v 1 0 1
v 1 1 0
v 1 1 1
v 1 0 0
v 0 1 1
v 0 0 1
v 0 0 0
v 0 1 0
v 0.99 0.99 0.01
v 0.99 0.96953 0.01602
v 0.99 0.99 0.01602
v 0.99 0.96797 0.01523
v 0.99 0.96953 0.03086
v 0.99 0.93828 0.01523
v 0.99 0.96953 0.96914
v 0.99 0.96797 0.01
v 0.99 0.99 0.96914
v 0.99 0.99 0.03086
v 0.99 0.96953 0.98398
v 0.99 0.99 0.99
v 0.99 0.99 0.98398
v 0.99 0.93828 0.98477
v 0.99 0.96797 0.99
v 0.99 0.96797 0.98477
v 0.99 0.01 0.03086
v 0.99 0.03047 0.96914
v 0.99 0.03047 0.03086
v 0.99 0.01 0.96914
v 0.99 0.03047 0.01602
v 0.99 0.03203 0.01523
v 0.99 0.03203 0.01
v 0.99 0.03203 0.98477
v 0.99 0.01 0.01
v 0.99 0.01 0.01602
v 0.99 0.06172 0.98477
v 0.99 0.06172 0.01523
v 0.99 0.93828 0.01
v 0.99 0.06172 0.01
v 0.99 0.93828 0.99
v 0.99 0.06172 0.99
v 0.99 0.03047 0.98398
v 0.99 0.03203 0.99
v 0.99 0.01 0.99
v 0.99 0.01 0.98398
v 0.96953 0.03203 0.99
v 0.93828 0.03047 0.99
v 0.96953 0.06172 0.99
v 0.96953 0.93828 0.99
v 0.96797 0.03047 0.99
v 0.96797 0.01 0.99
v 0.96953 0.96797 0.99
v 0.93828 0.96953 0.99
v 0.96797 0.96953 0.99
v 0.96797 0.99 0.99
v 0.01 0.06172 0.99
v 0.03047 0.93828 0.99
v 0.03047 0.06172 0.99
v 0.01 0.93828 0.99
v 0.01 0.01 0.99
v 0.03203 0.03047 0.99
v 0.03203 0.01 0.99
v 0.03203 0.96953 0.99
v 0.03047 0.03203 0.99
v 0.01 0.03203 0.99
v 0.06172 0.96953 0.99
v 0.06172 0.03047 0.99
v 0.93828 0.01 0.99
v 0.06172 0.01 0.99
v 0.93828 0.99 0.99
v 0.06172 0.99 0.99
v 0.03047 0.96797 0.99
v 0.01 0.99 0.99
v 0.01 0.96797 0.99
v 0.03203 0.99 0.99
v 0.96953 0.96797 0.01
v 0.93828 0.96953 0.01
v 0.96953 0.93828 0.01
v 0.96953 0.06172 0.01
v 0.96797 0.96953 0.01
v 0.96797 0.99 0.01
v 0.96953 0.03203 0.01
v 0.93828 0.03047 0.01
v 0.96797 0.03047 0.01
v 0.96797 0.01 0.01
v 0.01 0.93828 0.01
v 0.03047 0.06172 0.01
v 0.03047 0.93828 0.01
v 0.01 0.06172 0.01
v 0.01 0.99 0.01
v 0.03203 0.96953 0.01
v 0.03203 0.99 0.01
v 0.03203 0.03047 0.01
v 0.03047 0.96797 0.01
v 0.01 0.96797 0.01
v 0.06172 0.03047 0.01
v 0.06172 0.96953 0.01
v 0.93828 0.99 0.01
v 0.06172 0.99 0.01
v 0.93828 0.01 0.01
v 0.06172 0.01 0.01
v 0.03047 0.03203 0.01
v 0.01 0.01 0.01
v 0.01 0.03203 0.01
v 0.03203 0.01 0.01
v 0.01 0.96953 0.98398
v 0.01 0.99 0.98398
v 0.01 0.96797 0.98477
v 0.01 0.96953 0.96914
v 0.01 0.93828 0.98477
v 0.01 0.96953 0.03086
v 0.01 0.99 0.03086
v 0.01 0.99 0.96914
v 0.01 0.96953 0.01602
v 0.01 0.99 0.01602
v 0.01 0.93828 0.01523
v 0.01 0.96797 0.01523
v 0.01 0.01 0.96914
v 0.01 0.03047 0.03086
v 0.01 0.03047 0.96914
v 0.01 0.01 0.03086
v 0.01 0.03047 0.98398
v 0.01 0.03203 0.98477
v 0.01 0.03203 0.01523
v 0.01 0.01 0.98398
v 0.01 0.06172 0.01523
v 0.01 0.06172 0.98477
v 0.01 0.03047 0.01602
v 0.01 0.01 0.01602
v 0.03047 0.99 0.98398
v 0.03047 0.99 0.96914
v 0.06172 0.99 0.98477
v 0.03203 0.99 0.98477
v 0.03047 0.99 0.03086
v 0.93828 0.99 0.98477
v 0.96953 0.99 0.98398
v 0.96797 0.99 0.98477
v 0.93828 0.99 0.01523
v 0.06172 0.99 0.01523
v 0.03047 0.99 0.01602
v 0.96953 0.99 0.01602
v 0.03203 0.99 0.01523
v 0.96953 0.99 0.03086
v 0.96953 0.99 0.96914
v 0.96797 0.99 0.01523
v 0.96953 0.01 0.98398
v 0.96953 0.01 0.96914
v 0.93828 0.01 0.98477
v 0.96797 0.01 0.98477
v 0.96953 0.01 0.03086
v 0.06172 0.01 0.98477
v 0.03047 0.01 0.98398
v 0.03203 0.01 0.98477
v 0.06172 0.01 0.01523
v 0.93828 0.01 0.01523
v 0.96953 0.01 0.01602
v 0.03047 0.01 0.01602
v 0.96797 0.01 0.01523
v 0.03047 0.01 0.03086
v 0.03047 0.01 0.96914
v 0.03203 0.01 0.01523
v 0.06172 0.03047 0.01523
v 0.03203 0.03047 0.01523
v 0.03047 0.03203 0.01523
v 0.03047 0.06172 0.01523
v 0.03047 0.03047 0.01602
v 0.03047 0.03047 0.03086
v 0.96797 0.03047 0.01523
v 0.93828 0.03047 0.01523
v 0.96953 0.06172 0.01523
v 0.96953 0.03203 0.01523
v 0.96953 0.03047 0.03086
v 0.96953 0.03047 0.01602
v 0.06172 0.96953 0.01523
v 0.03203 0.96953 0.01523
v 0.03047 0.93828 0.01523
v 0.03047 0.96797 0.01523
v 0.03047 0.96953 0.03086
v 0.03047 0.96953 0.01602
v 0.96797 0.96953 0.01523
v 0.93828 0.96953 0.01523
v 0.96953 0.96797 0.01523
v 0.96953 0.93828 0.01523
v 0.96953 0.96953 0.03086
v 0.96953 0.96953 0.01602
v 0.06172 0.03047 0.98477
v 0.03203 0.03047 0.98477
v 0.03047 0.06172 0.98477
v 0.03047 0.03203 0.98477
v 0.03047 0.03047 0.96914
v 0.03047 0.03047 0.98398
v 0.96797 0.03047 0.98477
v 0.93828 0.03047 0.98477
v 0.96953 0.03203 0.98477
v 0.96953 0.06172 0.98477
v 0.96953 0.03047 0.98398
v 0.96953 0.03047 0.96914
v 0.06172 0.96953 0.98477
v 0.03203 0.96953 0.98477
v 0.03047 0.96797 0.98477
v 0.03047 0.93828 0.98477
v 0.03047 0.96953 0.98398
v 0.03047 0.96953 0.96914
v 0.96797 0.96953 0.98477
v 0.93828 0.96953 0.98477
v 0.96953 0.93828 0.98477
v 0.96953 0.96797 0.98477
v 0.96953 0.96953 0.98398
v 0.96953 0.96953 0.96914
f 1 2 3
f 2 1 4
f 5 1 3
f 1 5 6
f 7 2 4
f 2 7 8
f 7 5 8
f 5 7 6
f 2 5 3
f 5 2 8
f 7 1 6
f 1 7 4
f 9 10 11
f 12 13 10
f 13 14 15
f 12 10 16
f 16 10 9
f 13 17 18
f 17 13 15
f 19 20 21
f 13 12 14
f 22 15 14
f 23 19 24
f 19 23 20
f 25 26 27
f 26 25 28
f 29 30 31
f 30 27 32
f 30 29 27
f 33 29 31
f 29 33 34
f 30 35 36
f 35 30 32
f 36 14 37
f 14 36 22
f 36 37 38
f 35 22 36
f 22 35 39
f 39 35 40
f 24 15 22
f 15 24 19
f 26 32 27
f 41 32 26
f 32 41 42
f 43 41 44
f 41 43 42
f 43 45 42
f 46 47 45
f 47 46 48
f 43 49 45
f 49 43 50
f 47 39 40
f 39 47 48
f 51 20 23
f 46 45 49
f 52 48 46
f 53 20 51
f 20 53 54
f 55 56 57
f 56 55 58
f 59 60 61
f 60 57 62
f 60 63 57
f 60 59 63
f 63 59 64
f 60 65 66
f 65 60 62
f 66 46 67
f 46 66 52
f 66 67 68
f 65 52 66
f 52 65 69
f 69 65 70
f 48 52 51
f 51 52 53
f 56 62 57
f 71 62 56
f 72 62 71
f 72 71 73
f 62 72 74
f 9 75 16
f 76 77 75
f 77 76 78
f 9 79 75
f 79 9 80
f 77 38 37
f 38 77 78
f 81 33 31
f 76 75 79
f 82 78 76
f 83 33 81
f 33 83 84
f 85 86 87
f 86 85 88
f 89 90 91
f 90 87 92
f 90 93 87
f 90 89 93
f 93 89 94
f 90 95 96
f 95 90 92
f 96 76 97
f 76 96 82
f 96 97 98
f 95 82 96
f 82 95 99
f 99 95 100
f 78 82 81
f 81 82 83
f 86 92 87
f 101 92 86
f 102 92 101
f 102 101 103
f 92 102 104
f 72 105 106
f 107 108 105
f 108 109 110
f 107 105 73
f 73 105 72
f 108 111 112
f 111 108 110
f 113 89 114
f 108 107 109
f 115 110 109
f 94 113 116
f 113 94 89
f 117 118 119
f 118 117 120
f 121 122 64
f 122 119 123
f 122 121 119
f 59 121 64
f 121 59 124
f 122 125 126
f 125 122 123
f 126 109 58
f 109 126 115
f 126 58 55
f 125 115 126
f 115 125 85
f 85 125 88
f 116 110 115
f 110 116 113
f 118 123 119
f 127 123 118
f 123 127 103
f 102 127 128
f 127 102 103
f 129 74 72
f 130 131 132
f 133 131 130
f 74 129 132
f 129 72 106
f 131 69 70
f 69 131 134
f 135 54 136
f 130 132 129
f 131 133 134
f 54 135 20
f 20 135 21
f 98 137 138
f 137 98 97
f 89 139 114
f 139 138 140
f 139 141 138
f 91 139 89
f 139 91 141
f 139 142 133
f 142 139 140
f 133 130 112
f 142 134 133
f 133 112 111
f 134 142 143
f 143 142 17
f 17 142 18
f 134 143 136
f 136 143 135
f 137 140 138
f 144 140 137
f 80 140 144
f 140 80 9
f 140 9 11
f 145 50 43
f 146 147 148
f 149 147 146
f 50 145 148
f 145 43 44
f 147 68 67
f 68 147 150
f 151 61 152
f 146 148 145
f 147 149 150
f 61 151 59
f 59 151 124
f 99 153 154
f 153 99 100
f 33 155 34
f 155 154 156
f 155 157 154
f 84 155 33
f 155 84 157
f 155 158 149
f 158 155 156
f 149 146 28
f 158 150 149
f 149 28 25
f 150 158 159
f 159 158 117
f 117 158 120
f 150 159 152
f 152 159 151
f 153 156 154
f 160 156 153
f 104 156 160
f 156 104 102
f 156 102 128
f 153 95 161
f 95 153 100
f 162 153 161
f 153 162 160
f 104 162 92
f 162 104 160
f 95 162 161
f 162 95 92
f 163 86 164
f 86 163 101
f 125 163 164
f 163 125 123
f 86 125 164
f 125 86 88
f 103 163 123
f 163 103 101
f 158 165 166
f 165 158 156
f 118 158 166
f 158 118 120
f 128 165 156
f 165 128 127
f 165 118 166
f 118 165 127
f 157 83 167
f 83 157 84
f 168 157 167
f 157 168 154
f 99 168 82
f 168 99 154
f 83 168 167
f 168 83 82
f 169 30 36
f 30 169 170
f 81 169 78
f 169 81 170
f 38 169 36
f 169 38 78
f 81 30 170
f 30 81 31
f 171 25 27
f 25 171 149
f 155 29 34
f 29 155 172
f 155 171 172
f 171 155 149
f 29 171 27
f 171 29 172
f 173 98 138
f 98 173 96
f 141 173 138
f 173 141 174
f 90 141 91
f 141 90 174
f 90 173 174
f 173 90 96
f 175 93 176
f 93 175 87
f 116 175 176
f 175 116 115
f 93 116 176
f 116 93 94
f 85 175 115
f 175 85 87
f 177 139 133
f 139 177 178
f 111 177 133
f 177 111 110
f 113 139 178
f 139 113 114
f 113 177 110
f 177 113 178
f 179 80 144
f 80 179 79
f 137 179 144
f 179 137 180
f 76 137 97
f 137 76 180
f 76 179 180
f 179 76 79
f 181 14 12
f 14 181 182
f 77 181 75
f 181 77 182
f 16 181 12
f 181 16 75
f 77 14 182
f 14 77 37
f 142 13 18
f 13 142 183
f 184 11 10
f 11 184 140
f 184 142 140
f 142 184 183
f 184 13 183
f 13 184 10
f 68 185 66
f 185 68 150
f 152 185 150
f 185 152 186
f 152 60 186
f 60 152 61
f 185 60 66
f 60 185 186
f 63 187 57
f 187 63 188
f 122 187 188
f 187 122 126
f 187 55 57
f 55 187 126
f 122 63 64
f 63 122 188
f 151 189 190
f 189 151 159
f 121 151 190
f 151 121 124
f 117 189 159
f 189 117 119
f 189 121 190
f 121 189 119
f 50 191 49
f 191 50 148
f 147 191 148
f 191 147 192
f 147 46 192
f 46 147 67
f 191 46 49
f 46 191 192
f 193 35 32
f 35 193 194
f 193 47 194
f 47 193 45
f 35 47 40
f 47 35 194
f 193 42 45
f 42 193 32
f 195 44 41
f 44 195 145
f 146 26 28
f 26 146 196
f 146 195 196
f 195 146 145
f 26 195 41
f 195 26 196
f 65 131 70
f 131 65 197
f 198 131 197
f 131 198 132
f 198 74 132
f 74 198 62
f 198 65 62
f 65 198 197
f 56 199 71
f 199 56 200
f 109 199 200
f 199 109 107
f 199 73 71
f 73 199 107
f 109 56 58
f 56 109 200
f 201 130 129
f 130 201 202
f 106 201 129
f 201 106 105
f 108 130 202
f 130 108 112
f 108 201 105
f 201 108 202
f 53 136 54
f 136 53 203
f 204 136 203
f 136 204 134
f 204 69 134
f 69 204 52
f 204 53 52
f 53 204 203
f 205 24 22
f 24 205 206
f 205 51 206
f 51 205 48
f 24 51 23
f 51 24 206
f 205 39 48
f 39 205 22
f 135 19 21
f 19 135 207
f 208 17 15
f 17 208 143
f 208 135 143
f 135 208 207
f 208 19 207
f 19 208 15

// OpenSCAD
translate([0.046875, 0.015625, 0.0078125]) color([0.35340897744289224, 0.12062022214202717, 0.7238287945893779]) cube([0.0296875, 0.0296875, 0.01484375], center=true);
translate([0.015625, 0.046875, 0.0078125]) color([0.8432397019629626, 0.2883830928152321, 0.23139986036280558]) cube([0.0296875, 0.0296875, 0.01484375], center=true);
translate([0.015625, 0.015625, 0.0234375]) color([0.0180364627349191, 0.35314011923198985, 0.9589424474672257]) cube([0.0296875, 0.0296875, 0.01484375], center=true);
translate([0.953125, 0.015625, 0.0078125]) color([0.2619290021782883, 0.20369548429490625, 0.5420815487250377]) cube([0.0296875, 0.0296875, 0.01484375], center=true);
translate([0.984375, 0.046875, 0.0078125]) color([0.9221305525684157, 0.837748898711002, 0.8622867035840079]) cube([0.0296875, 0.0296875, 0.01484375], center=true);
translate([0.984375, 0.015625, 0.0234375]) color([0.727429224436118, 0.821332708873966, 0.2567577523046298]) cube([0.0296875, 0.0296875, 0.01484375], center=true);
translate([0.046875, 0.984375, 0.0078125]) color([0.1353372895865157, 0.7613019869252476, 0.15437996216449157]) cube([0.0296875, 0.0296875, 0.01484375], center=true);
translate([0.015625, 0.953125, 0.0078125]) color([0.5724302025923821, 0.22728732004270547, 0.8377719495956792]) cube([0.0296875, 0.0296875, 0.01484375], center=true);
translate([0.015625, 0.984375, 0.0234375]) color([0.3661955888727618, 0.7135191579002272, 0.515047468161266]) cube([0.0296875, 0.0296875, 0.01484375], center=true);
translate([0.953125, 0.984375, 0.0078125]) color([0.13764795316468892, 0.40448573996937276, 0.8917260836787828]) cube([0.0296875, 0.0296875, 0.01484375], center=true);
translate([0.984375, 0.953125, 0.0078125]) color([0.7643233656004556, 0.5236824296690593, 0.15029798138806982]) cube([0.0296875, 0.0296875, 0.01484375], center=true);
translate([0.984375, 0.984375, 0.0234375]) color([0.9580407420374472, 0.6000911555631969, 0.025324835711835636]) cube([0.0296875, 0.0296875, 0.01484375], center=true);
translate([0.046875, 0.015625, 0.9921875]) color([0.8628581448400192, 0.48332959823715915, 0.760144685355809]) cube([0.0296875, 0.0296875, 0.01484375], center=true);
translate([0.015625, 0.046875, 0.9921875]) color([0.17349489212301172, 0.7172022627612936, 0.8738126079333703]) cube([0.0296875, 0.0296875, 0.01484375], center=true);
translate([0.015625, 0.015625, 0.9765625]) color([0.7407081150283871, 0.1750257628023656, 0.7717601752613227]) cube([0.0296875, 0.0296875, 0.01484375], center=true);
translate([0.953125, 0.015625, 0.9921875]) color([0.17462951192396858, 0.1365817917740666, 0.790898096633715]) cube([0.0296875, 0.0296875, 0.01484375], center=true);
translate([0.984375, 0.046875, 0.9921875]) color([0.05068813004758421, 0.2747417086491215, 0.9775332998919624]) cube([0.0296875, 0.0296875, 0.01484375], center=true);
translate([0.984375, 0.015625, 0.9765625]) color([0.3741990821064618, 0.5760507248775137, 0.9764706525564496]) cube([0.0296875, 0.0296875, 0.01484375], center=true);
translate([0.046875, 0.984375, 0.9921875]) color([0.6412339051880062, 0.9116486495874845, 0.653753263894704]) cube([0.0296875, 0.0296875, 0.01484375], center=true);
translate([0.015625, 0.953125, 0.9921875]) color([0.7391387592304974, 0.7973855488942889, 0.8338139774032114]) cube([0.0296875, 0.0296875, 0.01484375], center=true);
translate([0.015625, 0.984375, 0.9765625]) color([0.5893068505654989, 0.9387852932083598, 0.6768105799142914]) cube([0.0296875, 0.0296875, 0.01484375], center=true);
translate([0.953125, 0.984375, 0.9921875]) color([0.26314077483765086, 0.6459233453457565, 0.8790980253849315]) cube([0.0296875, 0.0296875, 0.01484375], center=true);
translate([0.984375, 0.953125, 0.9921875]) color([0.15362837418895858, 0.31061588741770185, 0.8944360920803668]) cube([0.0296875, 0.0296875, 0.01484375], center=true);
translate([0.984375, 0.984375, 0.9765625]) color([0.2723573567519545, 0.029723278769515638, 0.14137415559711708]) cube([0.0296875, 0.0296875, 0.01484375], center=true);
color([0.3,0.3,0.3,0.3]) difference() { cube([1,1,1]); translate([0.01,0.01,0.01]) cube([0.98,0.98,0.98]); }
